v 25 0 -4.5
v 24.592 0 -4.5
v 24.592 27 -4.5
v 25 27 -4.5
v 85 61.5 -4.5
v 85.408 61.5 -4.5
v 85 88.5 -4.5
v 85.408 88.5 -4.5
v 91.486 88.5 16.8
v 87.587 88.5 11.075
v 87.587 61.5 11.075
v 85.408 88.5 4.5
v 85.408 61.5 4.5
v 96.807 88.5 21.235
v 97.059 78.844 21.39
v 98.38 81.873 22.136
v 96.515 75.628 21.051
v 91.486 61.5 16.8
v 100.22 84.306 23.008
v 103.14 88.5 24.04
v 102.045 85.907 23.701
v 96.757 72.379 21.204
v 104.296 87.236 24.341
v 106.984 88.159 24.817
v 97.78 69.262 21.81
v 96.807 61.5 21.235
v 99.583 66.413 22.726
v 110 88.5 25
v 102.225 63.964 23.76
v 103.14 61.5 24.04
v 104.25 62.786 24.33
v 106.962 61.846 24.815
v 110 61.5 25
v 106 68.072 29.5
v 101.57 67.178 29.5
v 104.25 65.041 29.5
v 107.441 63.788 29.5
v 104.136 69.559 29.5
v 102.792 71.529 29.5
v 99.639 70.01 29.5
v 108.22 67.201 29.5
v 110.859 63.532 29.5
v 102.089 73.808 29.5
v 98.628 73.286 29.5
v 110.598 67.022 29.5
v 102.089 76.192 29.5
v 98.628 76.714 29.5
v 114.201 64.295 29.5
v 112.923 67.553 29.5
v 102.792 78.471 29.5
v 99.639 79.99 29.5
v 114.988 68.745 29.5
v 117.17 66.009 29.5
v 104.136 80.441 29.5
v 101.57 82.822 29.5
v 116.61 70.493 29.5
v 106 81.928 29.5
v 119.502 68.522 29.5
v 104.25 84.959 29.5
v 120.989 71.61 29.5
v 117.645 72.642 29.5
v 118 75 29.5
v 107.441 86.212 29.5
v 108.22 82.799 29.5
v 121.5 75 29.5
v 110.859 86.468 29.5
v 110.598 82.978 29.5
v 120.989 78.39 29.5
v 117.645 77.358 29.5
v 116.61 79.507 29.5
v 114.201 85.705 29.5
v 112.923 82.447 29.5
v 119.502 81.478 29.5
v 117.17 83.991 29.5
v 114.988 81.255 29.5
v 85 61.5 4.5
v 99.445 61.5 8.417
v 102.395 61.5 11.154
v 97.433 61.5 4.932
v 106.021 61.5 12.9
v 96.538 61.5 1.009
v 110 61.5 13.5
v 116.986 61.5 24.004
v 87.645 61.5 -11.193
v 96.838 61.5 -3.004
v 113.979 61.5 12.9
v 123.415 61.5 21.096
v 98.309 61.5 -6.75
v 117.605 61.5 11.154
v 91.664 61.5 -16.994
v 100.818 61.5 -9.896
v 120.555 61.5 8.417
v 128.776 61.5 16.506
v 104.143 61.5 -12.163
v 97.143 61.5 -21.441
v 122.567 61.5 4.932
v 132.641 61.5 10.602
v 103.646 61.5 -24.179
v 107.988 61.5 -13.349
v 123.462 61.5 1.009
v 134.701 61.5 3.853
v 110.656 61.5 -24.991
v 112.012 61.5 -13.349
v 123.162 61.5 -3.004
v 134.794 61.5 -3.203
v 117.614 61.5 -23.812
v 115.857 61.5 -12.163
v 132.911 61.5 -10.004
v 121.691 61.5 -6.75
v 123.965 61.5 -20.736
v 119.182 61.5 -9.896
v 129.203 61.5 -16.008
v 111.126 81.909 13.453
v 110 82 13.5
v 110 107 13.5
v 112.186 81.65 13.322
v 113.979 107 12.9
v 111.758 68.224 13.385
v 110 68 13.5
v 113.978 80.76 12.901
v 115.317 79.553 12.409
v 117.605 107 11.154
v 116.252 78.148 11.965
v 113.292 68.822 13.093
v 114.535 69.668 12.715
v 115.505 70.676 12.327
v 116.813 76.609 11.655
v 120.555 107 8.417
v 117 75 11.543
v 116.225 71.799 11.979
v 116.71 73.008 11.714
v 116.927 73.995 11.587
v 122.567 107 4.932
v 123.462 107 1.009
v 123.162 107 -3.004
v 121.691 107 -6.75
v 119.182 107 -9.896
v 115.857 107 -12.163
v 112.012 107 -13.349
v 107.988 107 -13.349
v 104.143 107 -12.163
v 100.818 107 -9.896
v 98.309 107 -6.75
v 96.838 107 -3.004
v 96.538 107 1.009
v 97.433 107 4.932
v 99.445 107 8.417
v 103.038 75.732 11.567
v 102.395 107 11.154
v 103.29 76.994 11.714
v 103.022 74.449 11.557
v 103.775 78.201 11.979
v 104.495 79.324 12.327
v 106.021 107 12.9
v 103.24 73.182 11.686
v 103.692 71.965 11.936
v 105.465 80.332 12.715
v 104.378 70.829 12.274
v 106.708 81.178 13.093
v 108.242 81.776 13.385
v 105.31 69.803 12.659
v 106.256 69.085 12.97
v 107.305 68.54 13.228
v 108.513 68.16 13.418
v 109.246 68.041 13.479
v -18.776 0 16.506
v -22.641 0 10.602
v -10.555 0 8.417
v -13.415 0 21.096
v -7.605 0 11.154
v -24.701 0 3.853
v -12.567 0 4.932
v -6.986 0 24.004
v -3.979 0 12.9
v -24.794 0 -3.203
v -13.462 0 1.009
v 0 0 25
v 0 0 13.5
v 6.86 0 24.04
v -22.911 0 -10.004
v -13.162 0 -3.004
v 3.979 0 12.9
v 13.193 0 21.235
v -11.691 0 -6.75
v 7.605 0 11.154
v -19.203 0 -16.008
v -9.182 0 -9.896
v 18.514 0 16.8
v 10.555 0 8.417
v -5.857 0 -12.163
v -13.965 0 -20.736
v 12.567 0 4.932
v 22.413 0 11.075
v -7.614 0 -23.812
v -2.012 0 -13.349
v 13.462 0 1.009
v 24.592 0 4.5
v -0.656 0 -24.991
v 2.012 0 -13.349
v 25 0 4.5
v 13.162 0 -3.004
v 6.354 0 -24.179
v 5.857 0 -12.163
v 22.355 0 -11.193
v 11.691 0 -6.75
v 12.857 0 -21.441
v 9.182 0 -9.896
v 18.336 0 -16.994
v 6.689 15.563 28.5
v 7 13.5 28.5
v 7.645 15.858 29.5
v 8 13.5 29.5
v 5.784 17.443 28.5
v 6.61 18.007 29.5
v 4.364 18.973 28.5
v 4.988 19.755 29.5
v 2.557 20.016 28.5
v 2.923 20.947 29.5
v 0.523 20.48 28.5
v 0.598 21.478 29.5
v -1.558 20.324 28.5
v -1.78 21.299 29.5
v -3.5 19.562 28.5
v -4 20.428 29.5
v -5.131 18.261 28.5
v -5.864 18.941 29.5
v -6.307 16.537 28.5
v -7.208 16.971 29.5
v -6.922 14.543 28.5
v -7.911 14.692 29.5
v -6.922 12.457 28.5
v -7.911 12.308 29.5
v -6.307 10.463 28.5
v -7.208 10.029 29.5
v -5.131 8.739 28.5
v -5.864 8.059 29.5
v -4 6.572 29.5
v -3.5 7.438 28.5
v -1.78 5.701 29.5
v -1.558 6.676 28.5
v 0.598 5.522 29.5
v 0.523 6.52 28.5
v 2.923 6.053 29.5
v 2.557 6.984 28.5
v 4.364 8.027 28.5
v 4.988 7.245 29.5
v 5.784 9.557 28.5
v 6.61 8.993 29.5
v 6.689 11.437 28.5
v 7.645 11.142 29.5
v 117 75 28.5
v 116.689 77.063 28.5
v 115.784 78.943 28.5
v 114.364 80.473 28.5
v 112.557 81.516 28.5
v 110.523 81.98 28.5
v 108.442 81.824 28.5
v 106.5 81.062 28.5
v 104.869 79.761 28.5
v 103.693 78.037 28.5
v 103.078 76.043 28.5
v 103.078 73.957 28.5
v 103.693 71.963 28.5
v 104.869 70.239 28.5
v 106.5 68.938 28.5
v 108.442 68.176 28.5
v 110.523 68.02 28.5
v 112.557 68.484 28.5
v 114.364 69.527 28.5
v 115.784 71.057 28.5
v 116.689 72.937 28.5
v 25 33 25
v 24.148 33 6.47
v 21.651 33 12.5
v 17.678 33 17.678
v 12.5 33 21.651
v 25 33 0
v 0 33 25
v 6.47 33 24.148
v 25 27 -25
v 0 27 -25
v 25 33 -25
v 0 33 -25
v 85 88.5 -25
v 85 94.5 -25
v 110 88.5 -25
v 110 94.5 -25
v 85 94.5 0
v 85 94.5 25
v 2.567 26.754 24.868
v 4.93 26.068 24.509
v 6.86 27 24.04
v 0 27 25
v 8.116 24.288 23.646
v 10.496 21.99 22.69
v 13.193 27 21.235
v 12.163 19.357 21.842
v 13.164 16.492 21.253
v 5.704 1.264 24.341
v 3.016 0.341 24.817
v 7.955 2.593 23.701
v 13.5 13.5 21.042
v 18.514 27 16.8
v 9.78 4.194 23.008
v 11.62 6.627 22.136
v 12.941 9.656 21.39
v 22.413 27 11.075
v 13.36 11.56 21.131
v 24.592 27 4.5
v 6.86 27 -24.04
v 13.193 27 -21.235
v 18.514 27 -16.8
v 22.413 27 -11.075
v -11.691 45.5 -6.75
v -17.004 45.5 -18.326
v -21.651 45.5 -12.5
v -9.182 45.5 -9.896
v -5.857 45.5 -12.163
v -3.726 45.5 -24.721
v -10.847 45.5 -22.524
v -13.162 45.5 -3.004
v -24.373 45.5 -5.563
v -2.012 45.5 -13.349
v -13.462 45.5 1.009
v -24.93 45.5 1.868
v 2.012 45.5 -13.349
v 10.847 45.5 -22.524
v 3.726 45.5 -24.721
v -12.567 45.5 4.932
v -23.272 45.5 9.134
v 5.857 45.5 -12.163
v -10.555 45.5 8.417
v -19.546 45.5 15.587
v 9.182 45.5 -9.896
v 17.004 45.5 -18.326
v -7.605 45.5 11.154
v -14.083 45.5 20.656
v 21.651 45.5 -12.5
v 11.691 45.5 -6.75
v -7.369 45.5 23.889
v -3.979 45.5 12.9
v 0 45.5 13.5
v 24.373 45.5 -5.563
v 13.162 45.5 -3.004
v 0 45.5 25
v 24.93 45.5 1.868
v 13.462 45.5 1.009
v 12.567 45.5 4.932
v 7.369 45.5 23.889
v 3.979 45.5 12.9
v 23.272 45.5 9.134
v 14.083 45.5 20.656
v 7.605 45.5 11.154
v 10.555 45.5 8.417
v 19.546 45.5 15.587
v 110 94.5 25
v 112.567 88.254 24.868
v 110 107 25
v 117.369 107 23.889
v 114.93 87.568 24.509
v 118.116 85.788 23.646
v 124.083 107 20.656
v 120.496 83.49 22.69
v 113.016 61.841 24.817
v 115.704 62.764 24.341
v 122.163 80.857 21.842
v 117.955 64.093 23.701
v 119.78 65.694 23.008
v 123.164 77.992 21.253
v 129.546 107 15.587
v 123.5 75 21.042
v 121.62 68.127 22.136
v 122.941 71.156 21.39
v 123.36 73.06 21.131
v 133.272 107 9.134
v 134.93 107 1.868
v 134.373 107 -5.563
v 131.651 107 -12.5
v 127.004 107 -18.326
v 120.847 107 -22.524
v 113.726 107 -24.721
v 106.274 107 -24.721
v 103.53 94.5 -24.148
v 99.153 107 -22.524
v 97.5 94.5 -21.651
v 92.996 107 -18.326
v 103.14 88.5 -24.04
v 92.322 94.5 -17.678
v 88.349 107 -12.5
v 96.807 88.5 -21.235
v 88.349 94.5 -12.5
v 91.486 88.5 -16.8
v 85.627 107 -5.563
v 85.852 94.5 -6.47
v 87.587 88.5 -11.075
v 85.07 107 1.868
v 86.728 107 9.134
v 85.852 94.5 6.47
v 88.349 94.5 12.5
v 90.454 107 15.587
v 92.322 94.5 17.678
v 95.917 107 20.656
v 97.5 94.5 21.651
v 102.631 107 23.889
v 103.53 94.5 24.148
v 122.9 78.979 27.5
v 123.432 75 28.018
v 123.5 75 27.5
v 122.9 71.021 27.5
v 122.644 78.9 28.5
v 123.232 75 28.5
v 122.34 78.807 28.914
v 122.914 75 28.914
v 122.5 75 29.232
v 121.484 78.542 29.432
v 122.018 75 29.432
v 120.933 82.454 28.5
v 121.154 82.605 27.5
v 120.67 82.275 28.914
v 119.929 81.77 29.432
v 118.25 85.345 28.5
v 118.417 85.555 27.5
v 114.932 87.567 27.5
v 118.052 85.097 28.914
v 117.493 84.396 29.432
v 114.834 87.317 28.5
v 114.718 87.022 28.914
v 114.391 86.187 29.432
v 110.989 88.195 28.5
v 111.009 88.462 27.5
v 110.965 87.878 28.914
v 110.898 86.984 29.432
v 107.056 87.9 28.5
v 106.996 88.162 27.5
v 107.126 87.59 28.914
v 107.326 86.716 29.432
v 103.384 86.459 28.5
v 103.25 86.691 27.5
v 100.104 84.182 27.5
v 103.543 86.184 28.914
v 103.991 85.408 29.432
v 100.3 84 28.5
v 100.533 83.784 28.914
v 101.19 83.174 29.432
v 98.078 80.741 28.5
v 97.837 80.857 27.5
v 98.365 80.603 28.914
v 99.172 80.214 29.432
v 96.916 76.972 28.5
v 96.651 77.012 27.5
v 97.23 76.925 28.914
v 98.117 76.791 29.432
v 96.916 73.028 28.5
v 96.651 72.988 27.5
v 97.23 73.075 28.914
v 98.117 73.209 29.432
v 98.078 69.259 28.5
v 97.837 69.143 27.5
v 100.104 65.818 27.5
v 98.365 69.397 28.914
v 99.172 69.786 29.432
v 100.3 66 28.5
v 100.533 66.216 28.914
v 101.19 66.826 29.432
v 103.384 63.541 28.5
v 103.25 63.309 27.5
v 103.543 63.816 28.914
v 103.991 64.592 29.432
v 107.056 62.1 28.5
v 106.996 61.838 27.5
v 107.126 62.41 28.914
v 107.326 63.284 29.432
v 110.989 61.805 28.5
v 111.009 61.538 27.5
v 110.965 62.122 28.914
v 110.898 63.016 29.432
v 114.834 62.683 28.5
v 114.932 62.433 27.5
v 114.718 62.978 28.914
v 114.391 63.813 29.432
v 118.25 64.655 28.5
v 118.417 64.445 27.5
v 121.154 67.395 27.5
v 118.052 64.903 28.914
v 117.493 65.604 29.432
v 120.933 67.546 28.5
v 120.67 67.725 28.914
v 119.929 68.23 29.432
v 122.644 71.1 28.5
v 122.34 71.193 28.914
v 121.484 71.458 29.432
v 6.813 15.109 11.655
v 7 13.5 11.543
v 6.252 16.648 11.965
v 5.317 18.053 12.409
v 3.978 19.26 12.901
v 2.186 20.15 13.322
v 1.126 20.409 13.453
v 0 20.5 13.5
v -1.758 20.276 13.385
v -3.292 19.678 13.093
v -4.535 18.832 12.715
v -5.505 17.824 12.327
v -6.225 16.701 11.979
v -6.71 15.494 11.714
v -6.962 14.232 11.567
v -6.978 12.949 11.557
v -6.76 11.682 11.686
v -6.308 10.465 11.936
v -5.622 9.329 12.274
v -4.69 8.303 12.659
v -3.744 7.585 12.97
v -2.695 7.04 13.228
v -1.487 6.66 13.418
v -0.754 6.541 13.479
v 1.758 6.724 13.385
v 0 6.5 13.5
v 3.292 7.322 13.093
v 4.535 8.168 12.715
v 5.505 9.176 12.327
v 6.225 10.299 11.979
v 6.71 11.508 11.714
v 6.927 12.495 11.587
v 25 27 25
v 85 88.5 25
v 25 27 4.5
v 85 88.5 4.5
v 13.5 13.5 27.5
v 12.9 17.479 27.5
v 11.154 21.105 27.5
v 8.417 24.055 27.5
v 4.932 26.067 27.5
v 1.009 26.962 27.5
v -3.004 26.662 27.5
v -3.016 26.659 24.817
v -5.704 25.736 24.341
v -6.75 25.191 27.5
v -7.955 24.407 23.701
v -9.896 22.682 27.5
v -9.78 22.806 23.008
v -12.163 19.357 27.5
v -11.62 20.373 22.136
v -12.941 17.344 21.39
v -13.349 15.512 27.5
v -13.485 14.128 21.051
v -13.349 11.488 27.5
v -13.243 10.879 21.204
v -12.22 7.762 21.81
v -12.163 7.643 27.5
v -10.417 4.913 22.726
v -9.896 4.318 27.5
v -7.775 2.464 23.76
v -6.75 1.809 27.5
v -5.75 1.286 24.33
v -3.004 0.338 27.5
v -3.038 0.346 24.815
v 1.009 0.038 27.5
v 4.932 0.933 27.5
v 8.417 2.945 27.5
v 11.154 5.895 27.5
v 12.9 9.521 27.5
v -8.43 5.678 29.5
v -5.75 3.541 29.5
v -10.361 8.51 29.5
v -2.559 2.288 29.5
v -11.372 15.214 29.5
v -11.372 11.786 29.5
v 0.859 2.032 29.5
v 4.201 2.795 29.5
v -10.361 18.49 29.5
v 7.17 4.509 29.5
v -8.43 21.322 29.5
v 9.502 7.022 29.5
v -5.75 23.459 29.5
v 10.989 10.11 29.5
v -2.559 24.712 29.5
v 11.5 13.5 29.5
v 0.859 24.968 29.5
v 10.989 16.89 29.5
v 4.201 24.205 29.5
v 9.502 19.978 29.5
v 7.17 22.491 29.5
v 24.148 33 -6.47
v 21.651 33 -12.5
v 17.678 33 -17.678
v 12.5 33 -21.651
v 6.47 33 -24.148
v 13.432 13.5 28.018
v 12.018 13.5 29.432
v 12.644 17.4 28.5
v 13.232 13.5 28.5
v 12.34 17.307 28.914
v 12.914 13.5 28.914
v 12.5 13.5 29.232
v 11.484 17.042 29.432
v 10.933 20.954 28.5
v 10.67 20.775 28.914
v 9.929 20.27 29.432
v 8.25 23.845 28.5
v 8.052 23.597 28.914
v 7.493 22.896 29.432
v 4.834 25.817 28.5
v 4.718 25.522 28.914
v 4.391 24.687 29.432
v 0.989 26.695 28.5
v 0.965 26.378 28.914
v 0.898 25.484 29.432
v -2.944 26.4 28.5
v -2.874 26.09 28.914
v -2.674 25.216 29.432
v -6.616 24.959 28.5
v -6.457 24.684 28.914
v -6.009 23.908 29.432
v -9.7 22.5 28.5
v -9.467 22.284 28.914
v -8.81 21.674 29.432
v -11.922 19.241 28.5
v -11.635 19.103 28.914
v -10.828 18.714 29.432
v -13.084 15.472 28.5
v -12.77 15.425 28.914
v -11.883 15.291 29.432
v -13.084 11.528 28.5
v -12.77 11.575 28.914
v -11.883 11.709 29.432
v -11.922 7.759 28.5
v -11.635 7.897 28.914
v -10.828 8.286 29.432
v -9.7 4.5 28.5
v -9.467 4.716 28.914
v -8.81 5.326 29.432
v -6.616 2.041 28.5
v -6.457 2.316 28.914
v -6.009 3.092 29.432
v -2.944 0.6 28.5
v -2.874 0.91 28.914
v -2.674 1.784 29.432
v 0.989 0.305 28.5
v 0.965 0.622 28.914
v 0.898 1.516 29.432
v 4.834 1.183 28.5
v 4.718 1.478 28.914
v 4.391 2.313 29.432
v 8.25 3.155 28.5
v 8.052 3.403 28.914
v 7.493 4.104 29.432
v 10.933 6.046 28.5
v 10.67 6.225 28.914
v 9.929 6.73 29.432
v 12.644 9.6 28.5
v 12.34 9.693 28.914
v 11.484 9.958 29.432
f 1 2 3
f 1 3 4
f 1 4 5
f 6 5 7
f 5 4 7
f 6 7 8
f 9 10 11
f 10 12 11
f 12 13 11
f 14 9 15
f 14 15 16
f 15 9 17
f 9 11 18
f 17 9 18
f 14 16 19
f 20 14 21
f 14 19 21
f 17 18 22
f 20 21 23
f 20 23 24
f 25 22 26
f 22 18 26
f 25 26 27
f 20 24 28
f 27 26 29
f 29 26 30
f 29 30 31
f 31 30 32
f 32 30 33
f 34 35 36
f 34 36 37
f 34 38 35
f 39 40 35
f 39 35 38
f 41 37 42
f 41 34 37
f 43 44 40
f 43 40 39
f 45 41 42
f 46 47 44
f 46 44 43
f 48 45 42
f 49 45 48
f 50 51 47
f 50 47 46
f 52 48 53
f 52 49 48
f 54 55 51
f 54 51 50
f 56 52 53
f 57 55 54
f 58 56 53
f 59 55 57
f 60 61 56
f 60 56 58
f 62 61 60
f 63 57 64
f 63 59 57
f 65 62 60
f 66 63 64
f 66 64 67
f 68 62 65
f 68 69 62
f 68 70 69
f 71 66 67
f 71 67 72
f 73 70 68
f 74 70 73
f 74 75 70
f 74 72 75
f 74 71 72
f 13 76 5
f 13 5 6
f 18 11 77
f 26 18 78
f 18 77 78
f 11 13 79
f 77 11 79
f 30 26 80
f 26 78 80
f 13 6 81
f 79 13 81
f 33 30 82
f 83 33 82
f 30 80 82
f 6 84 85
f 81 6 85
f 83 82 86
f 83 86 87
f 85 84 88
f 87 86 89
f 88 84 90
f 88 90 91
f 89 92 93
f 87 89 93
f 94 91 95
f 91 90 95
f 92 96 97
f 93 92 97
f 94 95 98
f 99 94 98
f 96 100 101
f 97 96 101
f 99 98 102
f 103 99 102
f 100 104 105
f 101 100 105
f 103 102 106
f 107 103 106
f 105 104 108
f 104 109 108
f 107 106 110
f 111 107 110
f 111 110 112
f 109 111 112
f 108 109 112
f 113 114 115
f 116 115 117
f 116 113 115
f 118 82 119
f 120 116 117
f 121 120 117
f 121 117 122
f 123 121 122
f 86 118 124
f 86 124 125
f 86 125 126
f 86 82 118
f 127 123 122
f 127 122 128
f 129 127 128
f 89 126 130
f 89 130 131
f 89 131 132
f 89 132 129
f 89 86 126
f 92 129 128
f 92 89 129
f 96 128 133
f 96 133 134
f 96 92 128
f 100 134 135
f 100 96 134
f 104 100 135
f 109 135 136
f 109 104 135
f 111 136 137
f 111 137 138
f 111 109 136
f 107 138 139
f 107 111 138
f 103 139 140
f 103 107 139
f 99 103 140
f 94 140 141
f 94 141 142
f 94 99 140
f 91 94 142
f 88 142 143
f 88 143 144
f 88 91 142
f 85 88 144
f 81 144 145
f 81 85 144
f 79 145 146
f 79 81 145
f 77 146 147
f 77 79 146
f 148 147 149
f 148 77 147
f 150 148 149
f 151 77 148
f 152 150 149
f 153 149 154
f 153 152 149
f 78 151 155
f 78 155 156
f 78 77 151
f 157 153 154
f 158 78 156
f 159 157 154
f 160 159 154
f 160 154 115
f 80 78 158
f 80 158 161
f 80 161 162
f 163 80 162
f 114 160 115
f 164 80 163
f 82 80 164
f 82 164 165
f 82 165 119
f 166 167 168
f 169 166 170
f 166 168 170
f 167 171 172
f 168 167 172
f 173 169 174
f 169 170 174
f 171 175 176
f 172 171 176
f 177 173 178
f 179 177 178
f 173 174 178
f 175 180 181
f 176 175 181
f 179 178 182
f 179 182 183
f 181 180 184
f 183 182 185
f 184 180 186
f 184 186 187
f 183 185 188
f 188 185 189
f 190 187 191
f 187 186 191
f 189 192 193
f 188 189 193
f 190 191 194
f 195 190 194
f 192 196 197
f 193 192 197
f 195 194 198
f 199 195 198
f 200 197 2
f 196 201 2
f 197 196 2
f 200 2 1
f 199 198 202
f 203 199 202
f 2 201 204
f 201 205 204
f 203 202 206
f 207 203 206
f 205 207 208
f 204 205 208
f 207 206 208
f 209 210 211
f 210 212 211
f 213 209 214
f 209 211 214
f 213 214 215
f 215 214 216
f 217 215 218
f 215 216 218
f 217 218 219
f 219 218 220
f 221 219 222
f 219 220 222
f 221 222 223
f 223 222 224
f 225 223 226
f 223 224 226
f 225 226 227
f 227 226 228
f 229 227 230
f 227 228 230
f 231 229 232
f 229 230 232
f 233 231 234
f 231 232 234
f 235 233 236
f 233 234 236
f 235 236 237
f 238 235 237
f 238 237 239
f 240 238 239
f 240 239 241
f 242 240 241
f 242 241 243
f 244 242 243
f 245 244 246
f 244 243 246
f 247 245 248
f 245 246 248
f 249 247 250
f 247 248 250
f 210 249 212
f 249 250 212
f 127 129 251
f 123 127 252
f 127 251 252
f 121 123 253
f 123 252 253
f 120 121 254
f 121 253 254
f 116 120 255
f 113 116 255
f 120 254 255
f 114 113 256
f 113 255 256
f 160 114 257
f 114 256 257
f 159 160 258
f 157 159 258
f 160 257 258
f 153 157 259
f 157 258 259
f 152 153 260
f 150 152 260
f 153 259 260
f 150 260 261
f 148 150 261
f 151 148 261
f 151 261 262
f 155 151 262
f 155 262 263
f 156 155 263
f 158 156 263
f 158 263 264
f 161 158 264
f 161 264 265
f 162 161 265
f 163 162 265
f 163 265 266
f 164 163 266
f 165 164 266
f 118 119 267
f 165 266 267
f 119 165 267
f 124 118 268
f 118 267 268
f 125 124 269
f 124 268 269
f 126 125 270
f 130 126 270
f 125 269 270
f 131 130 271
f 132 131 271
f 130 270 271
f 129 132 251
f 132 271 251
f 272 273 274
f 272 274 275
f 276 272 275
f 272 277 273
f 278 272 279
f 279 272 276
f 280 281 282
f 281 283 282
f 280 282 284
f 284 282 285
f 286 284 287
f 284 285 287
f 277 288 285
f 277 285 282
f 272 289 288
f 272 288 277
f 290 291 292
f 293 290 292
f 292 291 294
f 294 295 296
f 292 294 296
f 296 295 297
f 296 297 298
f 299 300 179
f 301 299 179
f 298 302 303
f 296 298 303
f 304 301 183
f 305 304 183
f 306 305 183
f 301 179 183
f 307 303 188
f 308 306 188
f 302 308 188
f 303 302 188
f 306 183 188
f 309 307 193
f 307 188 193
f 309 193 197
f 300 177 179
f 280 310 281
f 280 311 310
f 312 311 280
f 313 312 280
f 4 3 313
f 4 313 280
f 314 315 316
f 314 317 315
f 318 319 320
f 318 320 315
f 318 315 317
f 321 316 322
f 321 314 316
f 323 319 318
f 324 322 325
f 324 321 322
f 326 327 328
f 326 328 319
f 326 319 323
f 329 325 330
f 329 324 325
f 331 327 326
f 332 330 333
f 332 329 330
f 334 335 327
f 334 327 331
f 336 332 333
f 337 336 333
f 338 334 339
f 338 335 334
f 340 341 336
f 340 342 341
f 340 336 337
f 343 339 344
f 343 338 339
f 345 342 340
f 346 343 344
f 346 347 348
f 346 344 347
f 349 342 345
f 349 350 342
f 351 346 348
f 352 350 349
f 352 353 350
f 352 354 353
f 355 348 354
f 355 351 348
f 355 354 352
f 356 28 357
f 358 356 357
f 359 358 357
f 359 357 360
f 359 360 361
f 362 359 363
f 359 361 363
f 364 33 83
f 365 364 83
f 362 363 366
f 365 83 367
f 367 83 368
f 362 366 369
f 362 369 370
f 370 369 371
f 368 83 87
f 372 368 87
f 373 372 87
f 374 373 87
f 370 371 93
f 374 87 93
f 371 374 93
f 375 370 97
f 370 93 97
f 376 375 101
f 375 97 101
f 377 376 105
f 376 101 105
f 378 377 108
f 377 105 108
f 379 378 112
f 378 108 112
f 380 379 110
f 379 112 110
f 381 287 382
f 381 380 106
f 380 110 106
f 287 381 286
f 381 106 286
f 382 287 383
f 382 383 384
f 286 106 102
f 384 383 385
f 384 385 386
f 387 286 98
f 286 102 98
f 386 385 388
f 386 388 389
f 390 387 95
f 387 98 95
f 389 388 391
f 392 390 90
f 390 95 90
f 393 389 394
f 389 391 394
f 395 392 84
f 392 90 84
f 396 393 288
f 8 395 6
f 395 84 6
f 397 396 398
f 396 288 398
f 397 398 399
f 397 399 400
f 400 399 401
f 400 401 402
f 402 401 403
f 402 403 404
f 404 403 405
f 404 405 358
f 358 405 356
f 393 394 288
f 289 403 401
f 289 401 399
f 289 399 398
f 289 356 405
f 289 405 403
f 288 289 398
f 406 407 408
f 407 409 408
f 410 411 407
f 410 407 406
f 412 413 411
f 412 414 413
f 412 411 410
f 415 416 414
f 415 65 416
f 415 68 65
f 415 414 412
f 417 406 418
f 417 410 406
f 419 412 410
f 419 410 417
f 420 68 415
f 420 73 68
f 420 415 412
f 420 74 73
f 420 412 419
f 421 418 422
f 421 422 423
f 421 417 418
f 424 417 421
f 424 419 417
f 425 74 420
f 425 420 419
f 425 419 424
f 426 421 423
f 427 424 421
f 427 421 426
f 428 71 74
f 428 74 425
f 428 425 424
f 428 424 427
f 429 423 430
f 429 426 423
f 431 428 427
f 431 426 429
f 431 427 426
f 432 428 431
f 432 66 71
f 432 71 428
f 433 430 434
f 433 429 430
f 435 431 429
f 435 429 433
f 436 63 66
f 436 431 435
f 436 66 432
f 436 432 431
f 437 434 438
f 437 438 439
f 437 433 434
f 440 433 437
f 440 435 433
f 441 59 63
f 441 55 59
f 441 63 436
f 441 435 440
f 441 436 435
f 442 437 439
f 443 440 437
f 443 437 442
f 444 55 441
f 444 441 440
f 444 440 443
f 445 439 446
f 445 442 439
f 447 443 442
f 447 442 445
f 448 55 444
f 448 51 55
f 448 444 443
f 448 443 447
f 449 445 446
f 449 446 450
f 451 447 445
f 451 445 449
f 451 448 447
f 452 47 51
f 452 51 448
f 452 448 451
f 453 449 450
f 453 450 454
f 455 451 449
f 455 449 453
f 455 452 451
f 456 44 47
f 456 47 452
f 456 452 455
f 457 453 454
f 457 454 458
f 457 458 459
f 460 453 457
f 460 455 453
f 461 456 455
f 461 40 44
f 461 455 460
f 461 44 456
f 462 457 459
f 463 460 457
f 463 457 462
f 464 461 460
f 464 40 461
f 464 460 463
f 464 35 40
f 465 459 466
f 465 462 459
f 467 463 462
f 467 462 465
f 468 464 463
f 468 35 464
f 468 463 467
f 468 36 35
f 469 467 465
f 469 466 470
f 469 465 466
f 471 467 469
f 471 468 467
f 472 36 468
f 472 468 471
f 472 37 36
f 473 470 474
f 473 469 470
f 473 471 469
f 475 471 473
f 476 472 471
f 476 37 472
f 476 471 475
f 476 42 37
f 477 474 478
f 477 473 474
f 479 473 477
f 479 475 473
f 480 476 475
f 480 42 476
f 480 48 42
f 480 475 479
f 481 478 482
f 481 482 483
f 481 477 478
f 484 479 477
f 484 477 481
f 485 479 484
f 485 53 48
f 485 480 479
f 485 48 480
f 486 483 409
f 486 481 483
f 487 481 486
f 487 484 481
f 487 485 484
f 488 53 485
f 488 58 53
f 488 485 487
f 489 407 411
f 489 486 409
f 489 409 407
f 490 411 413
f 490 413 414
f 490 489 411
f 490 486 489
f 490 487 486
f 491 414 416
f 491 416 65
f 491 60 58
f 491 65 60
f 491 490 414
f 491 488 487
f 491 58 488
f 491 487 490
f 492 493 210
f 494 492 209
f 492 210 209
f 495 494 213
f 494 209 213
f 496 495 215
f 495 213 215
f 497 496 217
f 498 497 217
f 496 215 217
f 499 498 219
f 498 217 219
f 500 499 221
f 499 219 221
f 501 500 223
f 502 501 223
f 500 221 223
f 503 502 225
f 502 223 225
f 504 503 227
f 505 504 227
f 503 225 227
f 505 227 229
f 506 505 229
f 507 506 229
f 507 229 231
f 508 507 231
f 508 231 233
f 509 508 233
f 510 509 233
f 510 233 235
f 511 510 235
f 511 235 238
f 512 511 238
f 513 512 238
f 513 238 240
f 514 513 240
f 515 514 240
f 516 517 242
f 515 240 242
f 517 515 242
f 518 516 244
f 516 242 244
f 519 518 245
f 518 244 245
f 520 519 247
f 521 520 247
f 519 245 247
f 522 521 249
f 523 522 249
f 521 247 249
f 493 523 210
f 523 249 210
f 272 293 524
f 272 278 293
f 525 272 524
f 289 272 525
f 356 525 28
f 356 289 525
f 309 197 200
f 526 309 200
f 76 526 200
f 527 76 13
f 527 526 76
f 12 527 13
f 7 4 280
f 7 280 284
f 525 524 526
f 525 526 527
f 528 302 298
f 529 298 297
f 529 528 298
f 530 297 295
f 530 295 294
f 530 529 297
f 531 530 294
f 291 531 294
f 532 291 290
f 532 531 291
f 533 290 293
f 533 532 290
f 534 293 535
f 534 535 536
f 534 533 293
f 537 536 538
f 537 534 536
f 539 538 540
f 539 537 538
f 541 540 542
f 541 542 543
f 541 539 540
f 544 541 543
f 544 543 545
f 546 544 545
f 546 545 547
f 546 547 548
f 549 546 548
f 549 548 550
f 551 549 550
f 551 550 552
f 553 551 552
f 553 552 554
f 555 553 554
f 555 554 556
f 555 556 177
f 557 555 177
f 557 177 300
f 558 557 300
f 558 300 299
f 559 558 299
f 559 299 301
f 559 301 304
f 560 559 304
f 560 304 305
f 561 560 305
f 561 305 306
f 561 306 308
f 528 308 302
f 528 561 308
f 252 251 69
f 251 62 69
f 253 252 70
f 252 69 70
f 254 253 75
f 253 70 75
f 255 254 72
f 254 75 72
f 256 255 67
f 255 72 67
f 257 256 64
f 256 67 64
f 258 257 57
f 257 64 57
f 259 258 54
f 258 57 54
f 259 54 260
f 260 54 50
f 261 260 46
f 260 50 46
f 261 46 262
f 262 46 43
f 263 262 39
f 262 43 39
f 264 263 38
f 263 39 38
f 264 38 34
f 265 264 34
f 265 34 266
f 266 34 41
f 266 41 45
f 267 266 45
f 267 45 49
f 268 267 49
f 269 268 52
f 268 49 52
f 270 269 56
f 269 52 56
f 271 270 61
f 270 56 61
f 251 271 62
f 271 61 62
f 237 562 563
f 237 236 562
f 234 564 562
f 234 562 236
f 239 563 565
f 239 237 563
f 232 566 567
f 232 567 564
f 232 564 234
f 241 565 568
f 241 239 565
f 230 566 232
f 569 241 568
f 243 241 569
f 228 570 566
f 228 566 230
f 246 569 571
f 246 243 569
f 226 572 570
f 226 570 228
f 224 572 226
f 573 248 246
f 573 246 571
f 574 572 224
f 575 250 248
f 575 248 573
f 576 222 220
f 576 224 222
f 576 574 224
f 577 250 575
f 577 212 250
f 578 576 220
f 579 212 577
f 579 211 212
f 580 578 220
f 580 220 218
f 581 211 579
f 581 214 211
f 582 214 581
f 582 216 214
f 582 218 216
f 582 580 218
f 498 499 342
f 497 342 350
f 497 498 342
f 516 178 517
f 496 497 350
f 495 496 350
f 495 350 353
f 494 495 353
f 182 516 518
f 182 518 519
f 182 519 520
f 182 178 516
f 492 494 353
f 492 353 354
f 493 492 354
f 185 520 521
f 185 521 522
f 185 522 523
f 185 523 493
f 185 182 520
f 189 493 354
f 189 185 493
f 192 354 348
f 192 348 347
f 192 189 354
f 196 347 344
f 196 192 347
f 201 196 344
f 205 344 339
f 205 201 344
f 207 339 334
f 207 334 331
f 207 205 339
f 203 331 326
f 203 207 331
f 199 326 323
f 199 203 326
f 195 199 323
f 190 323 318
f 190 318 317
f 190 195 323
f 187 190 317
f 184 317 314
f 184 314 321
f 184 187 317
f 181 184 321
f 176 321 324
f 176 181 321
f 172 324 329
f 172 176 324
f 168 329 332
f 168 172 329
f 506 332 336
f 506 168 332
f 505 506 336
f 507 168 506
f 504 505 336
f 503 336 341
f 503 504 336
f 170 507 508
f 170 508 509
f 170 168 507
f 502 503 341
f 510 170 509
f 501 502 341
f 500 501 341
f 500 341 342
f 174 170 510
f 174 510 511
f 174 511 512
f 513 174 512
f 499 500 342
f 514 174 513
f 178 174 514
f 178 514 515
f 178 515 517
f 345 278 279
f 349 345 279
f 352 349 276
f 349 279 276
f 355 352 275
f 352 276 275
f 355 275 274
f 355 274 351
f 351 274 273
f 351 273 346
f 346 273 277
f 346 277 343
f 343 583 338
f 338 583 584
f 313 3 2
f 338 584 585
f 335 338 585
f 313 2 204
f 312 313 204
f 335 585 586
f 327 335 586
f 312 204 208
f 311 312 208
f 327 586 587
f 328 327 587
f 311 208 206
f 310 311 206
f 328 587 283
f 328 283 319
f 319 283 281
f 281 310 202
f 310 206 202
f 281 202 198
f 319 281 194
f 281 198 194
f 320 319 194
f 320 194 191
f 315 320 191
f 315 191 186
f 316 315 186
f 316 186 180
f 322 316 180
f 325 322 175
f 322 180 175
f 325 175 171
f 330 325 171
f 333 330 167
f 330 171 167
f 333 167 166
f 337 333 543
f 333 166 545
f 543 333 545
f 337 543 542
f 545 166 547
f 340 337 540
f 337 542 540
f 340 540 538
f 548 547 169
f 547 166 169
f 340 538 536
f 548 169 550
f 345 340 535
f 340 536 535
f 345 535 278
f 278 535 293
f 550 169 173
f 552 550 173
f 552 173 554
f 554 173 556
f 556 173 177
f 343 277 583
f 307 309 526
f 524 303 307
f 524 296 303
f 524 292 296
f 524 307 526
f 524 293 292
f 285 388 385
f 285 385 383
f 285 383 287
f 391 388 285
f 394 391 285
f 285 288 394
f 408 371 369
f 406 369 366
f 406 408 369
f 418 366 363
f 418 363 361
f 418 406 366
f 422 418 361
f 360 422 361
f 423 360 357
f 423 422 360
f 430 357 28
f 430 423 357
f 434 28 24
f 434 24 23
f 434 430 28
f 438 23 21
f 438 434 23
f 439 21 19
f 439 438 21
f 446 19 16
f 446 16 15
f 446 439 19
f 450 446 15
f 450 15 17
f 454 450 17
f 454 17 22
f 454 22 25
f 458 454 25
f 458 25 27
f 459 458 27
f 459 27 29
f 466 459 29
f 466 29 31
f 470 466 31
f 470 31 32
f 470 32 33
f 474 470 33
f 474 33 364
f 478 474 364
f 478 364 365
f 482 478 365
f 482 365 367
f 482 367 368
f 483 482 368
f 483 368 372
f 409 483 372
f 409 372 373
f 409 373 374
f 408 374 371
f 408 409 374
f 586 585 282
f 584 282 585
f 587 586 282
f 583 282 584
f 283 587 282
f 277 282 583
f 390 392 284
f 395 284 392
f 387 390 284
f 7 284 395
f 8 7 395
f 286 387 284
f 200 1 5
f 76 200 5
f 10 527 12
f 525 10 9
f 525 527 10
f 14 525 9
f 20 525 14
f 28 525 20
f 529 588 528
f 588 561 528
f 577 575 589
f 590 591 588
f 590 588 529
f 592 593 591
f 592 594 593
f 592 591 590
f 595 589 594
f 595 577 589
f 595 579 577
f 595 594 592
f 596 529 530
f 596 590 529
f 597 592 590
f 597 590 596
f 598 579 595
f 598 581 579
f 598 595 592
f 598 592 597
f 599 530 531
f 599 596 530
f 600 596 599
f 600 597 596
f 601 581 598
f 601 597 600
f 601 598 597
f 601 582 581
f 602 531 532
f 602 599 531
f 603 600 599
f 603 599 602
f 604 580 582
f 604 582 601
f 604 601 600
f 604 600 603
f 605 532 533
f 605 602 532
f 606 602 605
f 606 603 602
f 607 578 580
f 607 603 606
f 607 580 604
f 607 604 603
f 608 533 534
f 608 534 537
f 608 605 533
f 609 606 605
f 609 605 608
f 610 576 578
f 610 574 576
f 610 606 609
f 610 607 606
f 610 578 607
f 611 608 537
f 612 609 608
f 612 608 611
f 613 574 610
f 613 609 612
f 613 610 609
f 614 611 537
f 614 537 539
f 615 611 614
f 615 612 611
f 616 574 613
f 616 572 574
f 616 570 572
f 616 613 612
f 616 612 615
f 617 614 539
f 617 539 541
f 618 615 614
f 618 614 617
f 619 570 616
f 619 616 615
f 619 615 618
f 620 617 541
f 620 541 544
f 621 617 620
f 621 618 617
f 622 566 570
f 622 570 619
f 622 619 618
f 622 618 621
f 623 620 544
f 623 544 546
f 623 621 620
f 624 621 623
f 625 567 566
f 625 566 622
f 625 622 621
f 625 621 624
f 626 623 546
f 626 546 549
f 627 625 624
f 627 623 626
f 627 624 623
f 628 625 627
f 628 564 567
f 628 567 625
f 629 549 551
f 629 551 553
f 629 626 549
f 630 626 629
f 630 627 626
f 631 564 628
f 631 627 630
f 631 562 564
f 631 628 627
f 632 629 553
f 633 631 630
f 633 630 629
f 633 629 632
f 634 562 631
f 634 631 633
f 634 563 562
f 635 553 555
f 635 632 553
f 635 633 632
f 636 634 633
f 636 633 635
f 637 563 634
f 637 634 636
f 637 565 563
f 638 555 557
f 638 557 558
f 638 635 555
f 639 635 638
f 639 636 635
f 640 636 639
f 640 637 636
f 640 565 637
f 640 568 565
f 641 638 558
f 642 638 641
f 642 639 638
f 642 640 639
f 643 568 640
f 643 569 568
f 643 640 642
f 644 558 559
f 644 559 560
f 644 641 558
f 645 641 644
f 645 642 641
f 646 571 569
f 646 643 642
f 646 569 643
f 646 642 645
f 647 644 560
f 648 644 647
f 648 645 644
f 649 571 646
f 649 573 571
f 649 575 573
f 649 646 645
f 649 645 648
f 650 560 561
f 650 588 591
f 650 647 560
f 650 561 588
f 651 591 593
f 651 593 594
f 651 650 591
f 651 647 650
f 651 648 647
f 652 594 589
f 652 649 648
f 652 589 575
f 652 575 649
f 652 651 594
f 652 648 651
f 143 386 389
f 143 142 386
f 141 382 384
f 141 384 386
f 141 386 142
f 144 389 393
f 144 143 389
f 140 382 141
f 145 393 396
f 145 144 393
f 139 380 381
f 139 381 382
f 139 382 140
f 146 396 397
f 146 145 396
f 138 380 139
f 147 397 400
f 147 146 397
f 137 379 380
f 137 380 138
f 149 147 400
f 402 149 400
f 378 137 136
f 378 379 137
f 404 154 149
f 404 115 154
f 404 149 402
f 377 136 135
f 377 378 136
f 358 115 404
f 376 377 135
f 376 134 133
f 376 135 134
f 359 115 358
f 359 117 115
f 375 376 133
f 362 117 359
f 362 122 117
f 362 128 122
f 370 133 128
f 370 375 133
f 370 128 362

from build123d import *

# Parameters (mm, degrees)
BOSS_EXTRUDE1_START     = 61.5
SKETCH2_R               = 25
SKETCH2_R_2             = 13.5
BOSS_EXTRUDE1_DEPTH     = 45.5
SKETCH2_3_R             = 25
SKETCH2_3_R_2           = 13.5
BOSS_EXTRUDE2_DEPTH     = 45.5
BOSS_EXTRUDE3_DEPTH     = 25
BOSS_EXTRUDE5_REACH     = 205.566
BOSS_EXTRUDE5_START     = 29.5
SKETCH4_R               = 13.5
RIB1_START              = -4.5
RIB1_DEPTH              = 9
FILLET1_R               = 2
CUT_EXTRUDE3_DEPTH      = 175.769133569
CUT_EXTRUDE3_DEPTH_BACK = 52.5
SKETCH10_R              = 13.5


with BuildPart() as part:
    # Sketch2 → Boss-Extrude1 (new body)
    with BuildSketch(Plane(origin=(0, 0, 0), x_dir=(1, 0, 0), z_dir=(0, 1, 0)).offset(BOSS_EXTRUDE1_START)):
        with Locations(Location((110, 0, 0), (0, 0, 270))):
            Circle(SKETCH2_R)
        with Locations(Location((110, 0, 0), (0, 0, 270))):
            Circle(SKETCH2_R_2, mode=Mode.SUBTRACT)
    extrude(amount=BOSS_EXTRUDE1_DEPTH)



with BuildPart() as body_2:
    # Sketch2<3> → Boss-Extrude2 (new body)
    with BuildSketch(Plane(origin=(0, 0, 0), x_dir=(1, 0, 0), z_dir=(0, 1, 0))):
        with Locations(Location((0, 0, 0), (0, 0, 270))):
            Circle(SKETCH2_3_R)
        with Locations(Location((0, 0, 0), (0, 0, 270))):
            Circle(SKETCH2_3_R_2, mode=Mode.SUBTRACT)
    extrude(amount=BOSS_EXTRUDE2_DEPTH)


with BuildPart() as part_1:
    add(part.part)

    add(body_2.part)  # Boss-Extrude3 merges body 2
    # Sketch3 → Boss-Extrude3 (add, symmetric)
    with BuildSketch(Plane.XY):
        Polygon((0, 27), (25, 27), (85, 88.5), (110, 88.5), (110, 94.5), (85, 94.5), (25, 33), (0, 33), align=None)
    extrude(amount=BOSS_EXTRUDE3_DEPTH, both=True)

    # Sketch4 → Boss-Extrude5 (add, up to next)
    with BuildSketch(Plane.XY.offset(BOSS_EXTRUDE5_START), mode=Mode.PRIVATE) as boss_extrude5_sk1:
        with Locations((0, 13.5)):
            Circle(SKETCH4_R)
    boss_extrude5_tool1 = extrude(boss_extrude5_sk1.sketch, amount=-BOSS_EXTRUDE5_REACH, mode=Mode.PRIVATE) - part_1.part
    # Sketch4 → Boss-Extrude5 (add, up to next)
    with BuildSketch(Plane.XY.offset(BOSS_EXTRUDE5_START), mode=Mode.PRIVATE) as boss_extrude5_sk2:
        with Locations((110, 75)):
            Circle(SKETCH4_R)
    boss_extrude5_tool2 = extrude(boss_extrude5_sk2.sketch, amount=-BOSS_EXTRUDE5_REACH, mode=Mode.PRIVATE) - part_1.part
    add(boss_extrude5_tool1.solids().sort_by_distance((0, 13.5, 29.5))[0])
    add(boss_extrude5_tool2.solids().sort_by_distance((110, 75, 29.5))[0])

    # Rib1: read off the stored shape, not the designer's step
    # Rib1 outline → Rib1 (add)
    with BuildSketch(Plane.XY.offset(RIB1_START)):
        Polygon((85, 61.5), (85.408334745, 61.5), (85.408334745, 88.5), (85, 88.5), (25, 27), (24.591665255, 27), (24.591665255, 0), (25, 0), align=None)
    extrude(amount=RIB1_DEPTH)

    # CSK for M16 SFHCS1: read off the stored shape, not the designer's step
    # CSK for M16 SFHCS1 outline → CSK for M16 SFHCS1 (revolve, cut)
    with BuildSketch(Plane(origin=(110, 75, 0), x_dir=(1, 0, 0), z_dir=(0, -1, 0))):
        Polygon((0, 11.543091406), (7, 11.543091406), (7, 28.5), (8, 29.5), (0, 29.5), align=None)
    revolve(axis=Axis((110, 75, 0), (0, 0, 1)), mode=Mode.SUBTRACT)

    # CSK for M16 SFHCS1 2 outline → CSK for M16 SFHCS1 2 (revolve, cut)
    with BuildSketch(Plane.XZ.offset(-13.5)):
        Polygon((0, 11.543091406), (7, 11.543091406), (7, 28.5), (8, 29.5), (0, 29.5), align=None)
    revolve(axis=Axis((0, 13.5, 0), (0, 0, 1)), mode=Mode.SUBTRACT)

    # Fillet1
    fillet1_edges = [part_1.edges().sort_by_distance(p)[0] for p in [
        (-13.5, 13.5, 29.5),
        (96.5, 75, 29.5),
    ]]
    fillet(fillet1_edges, radius=FILLET1_R)

    # Sketch10 → Cut-Extrude3 (cut, two sides: drawn at the far end of the back side and taken through both)
    with BuildSketch(Plane(origin=(0, 0, 0), x_dir=(1, 0, 0), z_dir=(0, 1, 0)).offset(-CUT_EXTRUDE3_DEPTH_BACK)):
        with Locations(Location((0, 0, 0), (0, 0, 270))):
            Circle(SKETCH10_R)
        with Locations(Location((110, 0, 0), (0, 0, 270))):
            Circle(SKETCH10_R)
    extrude(amount=CUT_EXTRUDE3_DEPTH + CUT_EXTRUDE3_DEPTH_BACK, mode=Mode.SUBTRACT)


solid = part_1.part
